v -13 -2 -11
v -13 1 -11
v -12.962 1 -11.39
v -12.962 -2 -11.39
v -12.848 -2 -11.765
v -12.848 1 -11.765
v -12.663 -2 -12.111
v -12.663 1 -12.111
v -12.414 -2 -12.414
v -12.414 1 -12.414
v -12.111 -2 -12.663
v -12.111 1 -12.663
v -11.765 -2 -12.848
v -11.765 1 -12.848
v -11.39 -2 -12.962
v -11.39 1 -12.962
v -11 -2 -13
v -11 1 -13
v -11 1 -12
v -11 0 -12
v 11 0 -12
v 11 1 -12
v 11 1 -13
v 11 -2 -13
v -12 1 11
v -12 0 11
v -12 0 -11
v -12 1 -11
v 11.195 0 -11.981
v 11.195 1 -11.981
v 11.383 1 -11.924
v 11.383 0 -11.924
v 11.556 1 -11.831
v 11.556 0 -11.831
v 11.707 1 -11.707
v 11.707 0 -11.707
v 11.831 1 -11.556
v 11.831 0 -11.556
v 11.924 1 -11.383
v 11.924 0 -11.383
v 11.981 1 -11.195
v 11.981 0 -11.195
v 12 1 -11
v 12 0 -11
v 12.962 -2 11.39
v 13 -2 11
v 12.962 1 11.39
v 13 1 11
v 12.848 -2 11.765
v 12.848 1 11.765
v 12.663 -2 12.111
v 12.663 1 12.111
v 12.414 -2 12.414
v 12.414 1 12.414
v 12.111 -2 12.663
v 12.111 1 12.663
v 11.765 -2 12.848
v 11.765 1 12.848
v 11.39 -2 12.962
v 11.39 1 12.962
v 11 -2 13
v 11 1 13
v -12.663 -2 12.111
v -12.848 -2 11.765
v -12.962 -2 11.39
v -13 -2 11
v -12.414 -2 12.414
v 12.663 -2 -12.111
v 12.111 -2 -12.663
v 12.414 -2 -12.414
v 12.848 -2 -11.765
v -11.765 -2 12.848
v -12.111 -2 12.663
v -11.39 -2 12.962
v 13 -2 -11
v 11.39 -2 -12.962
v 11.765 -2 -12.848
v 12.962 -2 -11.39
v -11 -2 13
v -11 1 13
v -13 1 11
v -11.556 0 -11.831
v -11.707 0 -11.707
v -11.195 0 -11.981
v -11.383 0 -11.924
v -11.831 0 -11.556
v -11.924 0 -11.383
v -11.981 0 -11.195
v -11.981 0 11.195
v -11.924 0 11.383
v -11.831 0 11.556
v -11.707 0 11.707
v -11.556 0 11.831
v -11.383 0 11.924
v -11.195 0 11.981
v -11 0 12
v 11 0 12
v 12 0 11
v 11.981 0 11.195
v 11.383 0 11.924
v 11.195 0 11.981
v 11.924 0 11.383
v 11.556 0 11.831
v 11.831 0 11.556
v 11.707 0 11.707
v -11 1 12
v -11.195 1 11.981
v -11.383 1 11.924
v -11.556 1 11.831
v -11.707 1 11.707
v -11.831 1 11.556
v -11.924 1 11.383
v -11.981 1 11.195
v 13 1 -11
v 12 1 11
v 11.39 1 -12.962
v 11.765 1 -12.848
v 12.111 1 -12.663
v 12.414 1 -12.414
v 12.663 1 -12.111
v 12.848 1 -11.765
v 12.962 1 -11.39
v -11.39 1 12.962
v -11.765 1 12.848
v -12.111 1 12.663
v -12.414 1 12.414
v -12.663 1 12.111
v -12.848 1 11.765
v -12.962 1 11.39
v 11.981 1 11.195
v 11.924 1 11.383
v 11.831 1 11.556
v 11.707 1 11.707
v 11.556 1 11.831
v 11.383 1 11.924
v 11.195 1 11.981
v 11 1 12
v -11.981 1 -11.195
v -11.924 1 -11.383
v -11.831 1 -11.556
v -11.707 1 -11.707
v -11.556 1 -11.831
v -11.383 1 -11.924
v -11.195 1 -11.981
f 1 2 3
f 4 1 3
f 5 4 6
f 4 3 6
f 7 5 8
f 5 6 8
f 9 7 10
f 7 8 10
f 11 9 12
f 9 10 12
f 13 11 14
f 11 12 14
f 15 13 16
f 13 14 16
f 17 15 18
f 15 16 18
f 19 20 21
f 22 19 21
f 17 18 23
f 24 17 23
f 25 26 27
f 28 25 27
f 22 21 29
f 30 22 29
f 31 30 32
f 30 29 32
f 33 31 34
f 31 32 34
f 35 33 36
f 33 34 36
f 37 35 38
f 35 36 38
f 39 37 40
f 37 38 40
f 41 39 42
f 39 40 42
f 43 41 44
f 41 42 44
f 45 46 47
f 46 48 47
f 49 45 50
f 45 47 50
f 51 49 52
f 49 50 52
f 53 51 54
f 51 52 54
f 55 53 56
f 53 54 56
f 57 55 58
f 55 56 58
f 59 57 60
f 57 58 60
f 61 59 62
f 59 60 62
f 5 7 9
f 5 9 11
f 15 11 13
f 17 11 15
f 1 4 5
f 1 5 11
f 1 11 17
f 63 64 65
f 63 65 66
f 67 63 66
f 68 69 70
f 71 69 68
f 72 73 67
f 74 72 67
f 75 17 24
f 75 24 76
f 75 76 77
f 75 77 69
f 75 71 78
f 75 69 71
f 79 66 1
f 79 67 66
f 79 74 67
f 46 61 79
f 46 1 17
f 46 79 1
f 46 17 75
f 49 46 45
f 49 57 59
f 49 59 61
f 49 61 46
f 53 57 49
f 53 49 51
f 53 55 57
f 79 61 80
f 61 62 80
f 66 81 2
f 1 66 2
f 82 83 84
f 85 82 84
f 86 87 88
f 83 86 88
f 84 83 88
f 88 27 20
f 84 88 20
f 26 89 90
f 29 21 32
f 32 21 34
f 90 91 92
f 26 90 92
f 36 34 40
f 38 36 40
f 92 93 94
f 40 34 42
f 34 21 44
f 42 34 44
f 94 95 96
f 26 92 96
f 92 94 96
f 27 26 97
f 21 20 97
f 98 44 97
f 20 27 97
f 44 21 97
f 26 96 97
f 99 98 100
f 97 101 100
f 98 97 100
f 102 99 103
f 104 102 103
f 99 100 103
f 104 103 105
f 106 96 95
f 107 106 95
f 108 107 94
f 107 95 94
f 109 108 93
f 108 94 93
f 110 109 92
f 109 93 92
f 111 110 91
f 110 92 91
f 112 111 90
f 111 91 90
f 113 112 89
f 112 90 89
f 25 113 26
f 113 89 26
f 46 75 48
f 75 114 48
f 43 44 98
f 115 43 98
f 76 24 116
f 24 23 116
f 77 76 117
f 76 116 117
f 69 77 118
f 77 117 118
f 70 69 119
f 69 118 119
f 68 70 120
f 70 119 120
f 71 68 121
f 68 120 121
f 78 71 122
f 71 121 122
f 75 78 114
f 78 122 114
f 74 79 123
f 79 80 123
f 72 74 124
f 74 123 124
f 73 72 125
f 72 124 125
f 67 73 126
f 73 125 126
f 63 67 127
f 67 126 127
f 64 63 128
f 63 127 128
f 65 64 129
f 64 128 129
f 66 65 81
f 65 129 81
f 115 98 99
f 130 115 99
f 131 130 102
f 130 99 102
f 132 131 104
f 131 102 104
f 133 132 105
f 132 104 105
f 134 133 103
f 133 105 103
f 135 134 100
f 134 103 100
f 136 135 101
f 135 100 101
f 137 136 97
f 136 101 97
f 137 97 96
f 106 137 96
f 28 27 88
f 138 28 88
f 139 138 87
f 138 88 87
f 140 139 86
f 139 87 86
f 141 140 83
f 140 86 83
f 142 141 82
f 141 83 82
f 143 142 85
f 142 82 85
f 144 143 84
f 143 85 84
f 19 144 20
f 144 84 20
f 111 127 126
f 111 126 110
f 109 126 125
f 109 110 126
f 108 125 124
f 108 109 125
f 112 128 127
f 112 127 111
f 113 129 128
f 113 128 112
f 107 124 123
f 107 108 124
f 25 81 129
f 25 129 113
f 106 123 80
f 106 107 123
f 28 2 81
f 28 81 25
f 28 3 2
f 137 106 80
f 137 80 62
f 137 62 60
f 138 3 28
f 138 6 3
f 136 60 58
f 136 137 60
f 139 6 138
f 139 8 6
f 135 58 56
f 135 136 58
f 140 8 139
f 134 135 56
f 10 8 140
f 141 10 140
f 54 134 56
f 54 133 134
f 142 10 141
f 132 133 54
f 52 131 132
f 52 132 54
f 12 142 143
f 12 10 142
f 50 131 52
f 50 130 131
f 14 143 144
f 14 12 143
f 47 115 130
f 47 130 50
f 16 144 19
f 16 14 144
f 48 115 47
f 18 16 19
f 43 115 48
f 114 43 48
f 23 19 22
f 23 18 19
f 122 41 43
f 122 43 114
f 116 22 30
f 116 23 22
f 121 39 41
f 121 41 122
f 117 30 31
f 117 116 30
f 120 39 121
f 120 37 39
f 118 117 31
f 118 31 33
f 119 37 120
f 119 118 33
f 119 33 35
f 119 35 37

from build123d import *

# Parameters (mm, degrees)
BOSS_EXTRUDE1_DEPTH = 1
BOSS_EXTRUDE2_DEPTH = 2


with BuildPart() as part:
    # Sketch1 → Boss-Extrude1 (new body)
    with BuildSketch(Plane(origin=(0, 0, 0), x_dir=(1, 0, 0), z_dir=(0, 1, 0))):
        with BuildLine():
            Line((-13, 11), (-13, -11))
            ThreePointArc((-13, -11), (-12.414213562, -12.414213562), (-11, -13))
            Line((-11, -13), (11, -13))
            ThreePointArc((11, -13), (12.414213562, -12.414213562), (13, -11))
            Line((13, -11), (13, 11))
            ThreePointArc((13, 11), (12.414213562, 12.414213562), (11, 13))
            Line((11, 13), (-11, 13))
            ThreePointArc((-11, 13), (-12.414213562, 12.414213562), (-13, 11))
        make_face()
        with BuildLine():
            Line((-11, 12), (11, 12))
            ThreePointArc((11, 12), (11.707106781, 11.707106781), (12, 11))
            Line((12, 11), (12, -11))
            ThreePointArc((12, -11), (11.707106781, -11.707106781), (11, -12))
            Line((11, -12), (-11, -12))
            ThreePointArc((-11, -12), (-11.707106781, -11.707106781), (-12, -11))
            Line((-12, -11), (-12, 11))
            ThreePointArc((-12, 11), (-11.707106781, 11.707106781), (-11, 12))
        make_face(mode=Mode.SUBTRACT)
    extrude(amount=BOSS_EXTRUDE1_DEPTH)

    # Sketch2 → Boss-Extrude2 (add)
    with BuildSketch(Plane.XZ):
        with BuildLine():
            Line((-11, -13), (11, -13))
            ThreePointArc((11, -13), (12.414213562, -12.414213562), (13, -11))
            Line((13, -11), (13, 11))
            ThreePointArc((13, 11), (12.414213562, 12.414213562), (11, 13))
            Line((11, 13), (-11, 13))
            ThreePointArc((-11, 13), (-12.414213562, 12.414213562), (-13, 11))
            Line((-13, 11), (-13, -11))
            ThreePointArc((-13, -11), (-12.414213562, -12.414213562), (-11, -13))
        make_face()
    extrude(amount=BOSS_EXTRUDE2_DEPTH)


solid = part.part
